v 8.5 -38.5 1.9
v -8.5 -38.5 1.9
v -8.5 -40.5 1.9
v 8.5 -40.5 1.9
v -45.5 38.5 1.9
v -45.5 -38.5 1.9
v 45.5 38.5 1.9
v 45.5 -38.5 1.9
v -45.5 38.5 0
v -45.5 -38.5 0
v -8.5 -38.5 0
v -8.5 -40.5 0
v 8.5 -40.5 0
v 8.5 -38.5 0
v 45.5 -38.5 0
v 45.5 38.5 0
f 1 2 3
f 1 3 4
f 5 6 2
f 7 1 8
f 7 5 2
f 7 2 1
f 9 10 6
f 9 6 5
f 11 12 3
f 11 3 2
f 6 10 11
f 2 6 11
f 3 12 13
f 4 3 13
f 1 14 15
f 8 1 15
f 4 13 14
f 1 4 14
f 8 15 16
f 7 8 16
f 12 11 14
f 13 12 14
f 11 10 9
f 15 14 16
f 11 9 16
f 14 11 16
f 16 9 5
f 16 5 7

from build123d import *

# Parameters (mm, degrees)
SKETCH_1_W      = 91
SKETCH_1_H      = 77
SKETCH_1_W_2    = 17
SKETCH_1_H_2    = 2
EXTRUDE_1_DEPTH = 1.9


with BuildPart() as part:
    # 草图1 → 凸台-拉伸1 (new body)
    with BuildSketch(Plane.XY):
        Rectangle(SKETCH_1_W, SKETCH_1_H)
        with Locations((0, -39.5)):
            Rectangle(SKETCH_1_W_2, SKETCH_1_H_2)
    extrude(amount=EXTRUDE_1_DEPTH)


solid = part.part
